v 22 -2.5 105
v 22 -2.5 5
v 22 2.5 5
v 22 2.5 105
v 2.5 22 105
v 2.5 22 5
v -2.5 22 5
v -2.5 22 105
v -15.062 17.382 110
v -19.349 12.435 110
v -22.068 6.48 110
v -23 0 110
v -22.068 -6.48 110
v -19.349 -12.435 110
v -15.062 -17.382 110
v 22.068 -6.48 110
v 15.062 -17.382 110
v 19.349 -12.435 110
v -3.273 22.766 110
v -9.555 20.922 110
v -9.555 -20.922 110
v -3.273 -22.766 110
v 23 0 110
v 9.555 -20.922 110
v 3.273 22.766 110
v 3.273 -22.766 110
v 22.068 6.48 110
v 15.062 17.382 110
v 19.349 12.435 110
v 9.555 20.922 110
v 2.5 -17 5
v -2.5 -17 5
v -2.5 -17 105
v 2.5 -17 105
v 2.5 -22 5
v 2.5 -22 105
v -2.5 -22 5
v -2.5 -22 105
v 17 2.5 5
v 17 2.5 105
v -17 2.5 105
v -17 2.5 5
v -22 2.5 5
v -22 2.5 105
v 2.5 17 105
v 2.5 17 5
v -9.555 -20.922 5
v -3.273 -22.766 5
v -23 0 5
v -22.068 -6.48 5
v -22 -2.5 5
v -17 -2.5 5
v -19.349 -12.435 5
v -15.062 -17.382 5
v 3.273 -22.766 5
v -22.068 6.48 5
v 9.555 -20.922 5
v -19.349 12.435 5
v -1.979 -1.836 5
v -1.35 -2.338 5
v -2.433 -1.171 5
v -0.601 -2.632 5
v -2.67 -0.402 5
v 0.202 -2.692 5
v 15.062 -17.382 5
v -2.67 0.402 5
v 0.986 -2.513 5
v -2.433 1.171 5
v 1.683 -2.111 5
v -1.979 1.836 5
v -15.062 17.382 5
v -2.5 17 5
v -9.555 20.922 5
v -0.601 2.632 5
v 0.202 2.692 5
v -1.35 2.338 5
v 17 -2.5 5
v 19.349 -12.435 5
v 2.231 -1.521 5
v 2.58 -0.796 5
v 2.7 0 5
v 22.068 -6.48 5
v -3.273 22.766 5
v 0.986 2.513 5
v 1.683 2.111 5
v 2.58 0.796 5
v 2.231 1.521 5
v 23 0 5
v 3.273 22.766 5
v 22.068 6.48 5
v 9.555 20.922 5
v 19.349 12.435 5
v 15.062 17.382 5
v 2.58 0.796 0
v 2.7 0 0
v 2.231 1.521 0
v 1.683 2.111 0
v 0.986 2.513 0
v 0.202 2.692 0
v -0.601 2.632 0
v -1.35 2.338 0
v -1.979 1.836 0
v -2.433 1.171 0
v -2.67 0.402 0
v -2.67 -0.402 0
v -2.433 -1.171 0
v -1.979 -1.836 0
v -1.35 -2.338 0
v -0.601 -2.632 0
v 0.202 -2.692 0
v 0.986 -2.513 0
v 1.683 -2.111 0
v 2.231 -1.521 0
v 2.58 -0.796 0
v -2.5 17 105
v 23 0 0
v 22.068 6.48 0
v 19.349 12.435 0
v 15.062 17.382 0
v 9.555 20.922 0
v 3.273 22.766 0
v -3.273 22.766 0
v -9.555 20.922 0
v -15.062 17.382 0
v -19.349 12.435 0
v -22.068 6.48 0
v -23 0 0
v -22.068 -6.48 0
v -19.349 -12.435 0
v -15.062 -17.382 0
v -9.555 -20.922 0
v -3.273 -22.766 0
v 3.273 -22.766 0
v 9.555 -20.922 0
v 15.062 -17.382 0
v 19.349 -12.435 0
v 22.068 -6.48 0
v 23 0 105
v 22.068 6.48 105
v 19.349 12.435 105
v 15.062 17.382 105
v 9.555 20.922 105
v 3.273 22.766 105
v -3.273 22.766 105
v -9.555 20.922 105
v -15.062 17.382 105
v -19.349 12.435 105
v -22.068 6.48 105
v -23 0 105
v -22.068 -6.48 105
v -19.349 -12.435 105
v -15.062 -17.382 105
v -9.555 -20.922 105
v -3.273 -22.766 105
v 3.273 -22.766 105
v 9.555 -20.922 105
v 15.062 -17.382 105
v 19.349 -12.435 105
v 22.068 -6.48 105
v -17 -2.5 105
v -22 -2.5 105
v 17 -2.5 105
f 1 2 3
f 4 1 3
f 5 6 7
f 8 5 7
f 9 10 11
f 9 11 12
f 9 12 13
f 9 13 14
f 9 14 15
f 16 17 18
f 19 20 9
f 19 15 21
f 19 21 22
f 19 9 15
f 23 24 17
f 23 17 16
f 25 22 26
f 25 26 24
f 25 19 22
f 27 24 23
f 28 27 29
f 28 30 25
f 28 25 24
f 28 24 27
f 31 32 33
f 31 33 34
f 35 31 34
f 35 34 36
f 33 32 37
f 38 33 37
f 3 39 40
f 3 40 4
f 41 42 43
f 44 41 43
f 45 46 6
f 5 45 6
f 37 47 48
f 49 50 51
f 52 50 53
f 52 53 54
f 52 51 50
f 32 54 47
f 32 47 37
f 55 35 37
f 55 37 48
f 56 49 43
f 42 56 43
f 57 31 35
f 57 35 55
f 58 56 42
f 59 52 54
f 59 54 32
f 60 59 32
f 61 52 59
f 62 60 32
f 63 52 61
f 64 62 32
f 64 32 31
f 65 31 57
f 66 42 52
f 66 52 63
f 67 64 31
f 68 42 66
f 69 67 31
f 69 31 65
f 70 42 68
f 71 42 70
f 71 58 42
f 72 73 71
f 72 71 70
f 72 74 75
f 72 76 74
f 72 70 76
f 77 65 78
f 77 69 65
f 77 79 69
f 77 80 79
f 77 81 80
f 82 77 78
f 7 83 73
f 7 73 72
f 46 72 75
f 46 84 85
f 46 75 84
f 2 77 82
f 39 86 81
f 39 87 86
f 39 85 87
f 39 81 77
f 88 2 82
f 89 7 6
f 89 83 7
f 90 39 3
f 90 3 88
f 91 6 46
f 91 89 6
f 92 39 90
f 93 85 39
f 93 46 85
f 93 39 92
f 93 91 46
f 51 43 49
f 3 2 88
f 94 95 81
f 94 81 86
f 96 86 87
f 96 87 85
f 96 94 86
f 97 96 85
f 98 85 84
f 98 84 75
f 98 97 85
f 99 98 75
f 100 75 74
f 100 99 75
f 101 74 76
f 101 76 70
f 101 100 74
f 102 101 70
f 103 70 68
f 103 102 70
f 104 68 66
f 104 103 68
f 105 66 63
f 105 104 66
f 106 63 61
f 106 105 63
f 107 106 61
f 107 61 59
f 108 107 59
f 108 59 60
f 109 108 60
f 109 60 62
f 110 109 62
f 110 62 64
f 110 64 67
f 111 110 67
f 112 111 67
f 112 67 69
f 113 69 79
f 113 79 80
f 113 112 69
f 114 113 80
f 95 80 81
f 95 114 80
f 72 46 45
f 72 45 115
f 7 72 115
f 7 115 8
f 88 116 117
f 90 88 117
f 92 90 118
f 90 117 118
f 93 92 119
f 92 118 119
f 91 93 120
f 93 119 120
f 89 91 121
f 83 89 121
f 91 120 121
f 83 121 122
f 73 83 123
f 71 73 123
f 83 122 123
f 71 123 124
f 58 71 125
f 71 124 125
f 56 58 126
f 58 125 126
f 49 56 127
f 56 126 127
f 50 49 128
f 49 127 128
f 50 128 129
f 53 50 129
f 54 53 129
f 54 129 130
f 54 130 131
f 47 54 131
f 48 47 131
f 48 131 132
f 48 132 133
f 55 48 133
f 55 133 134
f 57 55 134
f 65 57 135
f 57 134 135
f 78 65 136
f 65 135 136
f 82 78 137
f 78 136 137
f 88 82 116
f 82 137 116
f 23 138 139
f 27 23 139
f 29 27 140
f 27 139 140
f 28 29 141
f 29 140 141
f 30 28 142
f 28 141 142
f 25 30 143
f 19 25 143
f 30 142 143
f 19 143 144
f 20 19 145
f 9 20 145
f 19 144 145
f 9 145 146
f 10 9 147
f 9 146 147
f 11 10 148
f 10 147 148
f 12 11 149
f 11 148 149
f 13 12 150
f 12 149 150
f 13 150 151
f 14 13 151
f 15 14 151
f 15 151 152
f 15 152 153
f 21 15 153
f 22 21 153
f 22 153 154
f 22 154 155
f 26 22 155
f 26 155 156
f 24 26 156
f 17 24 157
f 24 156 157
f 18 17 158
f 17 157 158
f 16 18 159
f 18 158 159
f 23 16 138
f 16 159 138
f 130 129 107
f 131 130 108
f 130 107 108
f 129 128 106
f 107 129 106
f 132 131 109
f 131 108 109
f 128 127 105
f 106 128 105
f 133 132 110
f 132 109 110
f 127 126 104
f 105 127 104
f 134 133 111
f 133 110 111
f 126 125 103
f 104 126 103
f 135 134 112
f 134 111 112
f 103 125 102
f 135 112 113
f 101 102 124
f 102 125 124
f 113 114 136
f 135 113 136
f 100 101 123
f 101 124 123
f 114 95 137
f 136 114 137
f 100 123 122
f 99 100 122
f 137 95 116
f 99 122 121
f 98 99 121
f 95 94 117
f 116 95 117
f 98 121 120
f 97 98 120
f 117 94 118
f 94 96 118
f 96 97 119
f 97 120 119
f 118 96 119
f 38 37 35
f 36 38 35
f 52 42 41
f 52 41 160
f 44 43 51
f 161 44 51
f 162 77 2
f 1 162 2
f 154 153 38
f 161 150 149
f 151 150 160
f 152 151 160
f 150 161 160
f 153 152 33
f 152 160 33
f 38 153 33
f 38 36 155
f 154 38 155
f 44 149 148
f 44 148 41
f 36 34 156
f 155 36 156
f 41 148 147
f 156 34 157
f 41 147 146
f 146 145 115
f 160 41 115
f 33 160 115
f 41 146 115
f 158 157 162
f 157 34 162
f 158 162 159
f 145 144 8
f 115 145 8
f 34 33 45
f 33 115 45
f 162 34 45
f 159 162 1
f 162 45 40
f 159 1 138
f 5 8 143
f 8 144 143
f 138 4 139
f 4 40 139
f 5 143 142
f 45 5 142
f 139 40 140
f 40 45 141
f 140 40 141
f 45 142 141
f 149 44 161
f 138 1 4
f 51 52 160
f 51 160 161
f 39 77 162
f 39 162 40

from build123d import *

# Parameters (mm, degrees)
SKETCH_R           = 23
PAD_DEPTH          = 5
SKETCH001_R        = 2.7
POCKET_DEPTH       = 5
SKETCH002_W        = 5
SKETCH002_H        = 5
PAD001_DEPTH       = 100
POLARPATTERN_COUNT = 4
SKETCH003_R        = 23
PAD002_DEPTH       = 5


with BuildPart() as part:
    # Sketch → Pad (new body)
    with BuildSketch(Plane.XY):
        Circle(SKETCH_R)
    extrude(amount=PAD_DEPTH)

    # Sketch001 → Pocket (cut)
    with BuildSketch(Plane.XY):
        Circle(SKETCH001_R)
    extrude(amount=POCKET_DEPTH, mode=Mode.SUBTRACT)

    # Sketch002 → Pad001 (join)
    with BuildSketch(Plane.XY.offset(5)):
        with Locations((19.5, 0)):
            Rectangle(SKETCH002_W, SKETCH002_H)
    pad001 = extrude(amount=PAD001_DEPTH)

    # PolarPattern: Pad001 ×4 about axis
    polarpattern_axis = Axis((0, 0, 0), (0, 0, 1))
    for i in range(1, POLARPATTERN_COUNT):
        add(pad001.rotate(polarpattern_axis, i * 360 / POLARPATTERN_COUNT))

    # Sketch003 → Pad002 (join)
    with BuildSketch(Plane.XY.offset(105)):
        Circle(SKETCH003_R)
    extrude(amount=PAD002_DEPTH)


solid = part.part
